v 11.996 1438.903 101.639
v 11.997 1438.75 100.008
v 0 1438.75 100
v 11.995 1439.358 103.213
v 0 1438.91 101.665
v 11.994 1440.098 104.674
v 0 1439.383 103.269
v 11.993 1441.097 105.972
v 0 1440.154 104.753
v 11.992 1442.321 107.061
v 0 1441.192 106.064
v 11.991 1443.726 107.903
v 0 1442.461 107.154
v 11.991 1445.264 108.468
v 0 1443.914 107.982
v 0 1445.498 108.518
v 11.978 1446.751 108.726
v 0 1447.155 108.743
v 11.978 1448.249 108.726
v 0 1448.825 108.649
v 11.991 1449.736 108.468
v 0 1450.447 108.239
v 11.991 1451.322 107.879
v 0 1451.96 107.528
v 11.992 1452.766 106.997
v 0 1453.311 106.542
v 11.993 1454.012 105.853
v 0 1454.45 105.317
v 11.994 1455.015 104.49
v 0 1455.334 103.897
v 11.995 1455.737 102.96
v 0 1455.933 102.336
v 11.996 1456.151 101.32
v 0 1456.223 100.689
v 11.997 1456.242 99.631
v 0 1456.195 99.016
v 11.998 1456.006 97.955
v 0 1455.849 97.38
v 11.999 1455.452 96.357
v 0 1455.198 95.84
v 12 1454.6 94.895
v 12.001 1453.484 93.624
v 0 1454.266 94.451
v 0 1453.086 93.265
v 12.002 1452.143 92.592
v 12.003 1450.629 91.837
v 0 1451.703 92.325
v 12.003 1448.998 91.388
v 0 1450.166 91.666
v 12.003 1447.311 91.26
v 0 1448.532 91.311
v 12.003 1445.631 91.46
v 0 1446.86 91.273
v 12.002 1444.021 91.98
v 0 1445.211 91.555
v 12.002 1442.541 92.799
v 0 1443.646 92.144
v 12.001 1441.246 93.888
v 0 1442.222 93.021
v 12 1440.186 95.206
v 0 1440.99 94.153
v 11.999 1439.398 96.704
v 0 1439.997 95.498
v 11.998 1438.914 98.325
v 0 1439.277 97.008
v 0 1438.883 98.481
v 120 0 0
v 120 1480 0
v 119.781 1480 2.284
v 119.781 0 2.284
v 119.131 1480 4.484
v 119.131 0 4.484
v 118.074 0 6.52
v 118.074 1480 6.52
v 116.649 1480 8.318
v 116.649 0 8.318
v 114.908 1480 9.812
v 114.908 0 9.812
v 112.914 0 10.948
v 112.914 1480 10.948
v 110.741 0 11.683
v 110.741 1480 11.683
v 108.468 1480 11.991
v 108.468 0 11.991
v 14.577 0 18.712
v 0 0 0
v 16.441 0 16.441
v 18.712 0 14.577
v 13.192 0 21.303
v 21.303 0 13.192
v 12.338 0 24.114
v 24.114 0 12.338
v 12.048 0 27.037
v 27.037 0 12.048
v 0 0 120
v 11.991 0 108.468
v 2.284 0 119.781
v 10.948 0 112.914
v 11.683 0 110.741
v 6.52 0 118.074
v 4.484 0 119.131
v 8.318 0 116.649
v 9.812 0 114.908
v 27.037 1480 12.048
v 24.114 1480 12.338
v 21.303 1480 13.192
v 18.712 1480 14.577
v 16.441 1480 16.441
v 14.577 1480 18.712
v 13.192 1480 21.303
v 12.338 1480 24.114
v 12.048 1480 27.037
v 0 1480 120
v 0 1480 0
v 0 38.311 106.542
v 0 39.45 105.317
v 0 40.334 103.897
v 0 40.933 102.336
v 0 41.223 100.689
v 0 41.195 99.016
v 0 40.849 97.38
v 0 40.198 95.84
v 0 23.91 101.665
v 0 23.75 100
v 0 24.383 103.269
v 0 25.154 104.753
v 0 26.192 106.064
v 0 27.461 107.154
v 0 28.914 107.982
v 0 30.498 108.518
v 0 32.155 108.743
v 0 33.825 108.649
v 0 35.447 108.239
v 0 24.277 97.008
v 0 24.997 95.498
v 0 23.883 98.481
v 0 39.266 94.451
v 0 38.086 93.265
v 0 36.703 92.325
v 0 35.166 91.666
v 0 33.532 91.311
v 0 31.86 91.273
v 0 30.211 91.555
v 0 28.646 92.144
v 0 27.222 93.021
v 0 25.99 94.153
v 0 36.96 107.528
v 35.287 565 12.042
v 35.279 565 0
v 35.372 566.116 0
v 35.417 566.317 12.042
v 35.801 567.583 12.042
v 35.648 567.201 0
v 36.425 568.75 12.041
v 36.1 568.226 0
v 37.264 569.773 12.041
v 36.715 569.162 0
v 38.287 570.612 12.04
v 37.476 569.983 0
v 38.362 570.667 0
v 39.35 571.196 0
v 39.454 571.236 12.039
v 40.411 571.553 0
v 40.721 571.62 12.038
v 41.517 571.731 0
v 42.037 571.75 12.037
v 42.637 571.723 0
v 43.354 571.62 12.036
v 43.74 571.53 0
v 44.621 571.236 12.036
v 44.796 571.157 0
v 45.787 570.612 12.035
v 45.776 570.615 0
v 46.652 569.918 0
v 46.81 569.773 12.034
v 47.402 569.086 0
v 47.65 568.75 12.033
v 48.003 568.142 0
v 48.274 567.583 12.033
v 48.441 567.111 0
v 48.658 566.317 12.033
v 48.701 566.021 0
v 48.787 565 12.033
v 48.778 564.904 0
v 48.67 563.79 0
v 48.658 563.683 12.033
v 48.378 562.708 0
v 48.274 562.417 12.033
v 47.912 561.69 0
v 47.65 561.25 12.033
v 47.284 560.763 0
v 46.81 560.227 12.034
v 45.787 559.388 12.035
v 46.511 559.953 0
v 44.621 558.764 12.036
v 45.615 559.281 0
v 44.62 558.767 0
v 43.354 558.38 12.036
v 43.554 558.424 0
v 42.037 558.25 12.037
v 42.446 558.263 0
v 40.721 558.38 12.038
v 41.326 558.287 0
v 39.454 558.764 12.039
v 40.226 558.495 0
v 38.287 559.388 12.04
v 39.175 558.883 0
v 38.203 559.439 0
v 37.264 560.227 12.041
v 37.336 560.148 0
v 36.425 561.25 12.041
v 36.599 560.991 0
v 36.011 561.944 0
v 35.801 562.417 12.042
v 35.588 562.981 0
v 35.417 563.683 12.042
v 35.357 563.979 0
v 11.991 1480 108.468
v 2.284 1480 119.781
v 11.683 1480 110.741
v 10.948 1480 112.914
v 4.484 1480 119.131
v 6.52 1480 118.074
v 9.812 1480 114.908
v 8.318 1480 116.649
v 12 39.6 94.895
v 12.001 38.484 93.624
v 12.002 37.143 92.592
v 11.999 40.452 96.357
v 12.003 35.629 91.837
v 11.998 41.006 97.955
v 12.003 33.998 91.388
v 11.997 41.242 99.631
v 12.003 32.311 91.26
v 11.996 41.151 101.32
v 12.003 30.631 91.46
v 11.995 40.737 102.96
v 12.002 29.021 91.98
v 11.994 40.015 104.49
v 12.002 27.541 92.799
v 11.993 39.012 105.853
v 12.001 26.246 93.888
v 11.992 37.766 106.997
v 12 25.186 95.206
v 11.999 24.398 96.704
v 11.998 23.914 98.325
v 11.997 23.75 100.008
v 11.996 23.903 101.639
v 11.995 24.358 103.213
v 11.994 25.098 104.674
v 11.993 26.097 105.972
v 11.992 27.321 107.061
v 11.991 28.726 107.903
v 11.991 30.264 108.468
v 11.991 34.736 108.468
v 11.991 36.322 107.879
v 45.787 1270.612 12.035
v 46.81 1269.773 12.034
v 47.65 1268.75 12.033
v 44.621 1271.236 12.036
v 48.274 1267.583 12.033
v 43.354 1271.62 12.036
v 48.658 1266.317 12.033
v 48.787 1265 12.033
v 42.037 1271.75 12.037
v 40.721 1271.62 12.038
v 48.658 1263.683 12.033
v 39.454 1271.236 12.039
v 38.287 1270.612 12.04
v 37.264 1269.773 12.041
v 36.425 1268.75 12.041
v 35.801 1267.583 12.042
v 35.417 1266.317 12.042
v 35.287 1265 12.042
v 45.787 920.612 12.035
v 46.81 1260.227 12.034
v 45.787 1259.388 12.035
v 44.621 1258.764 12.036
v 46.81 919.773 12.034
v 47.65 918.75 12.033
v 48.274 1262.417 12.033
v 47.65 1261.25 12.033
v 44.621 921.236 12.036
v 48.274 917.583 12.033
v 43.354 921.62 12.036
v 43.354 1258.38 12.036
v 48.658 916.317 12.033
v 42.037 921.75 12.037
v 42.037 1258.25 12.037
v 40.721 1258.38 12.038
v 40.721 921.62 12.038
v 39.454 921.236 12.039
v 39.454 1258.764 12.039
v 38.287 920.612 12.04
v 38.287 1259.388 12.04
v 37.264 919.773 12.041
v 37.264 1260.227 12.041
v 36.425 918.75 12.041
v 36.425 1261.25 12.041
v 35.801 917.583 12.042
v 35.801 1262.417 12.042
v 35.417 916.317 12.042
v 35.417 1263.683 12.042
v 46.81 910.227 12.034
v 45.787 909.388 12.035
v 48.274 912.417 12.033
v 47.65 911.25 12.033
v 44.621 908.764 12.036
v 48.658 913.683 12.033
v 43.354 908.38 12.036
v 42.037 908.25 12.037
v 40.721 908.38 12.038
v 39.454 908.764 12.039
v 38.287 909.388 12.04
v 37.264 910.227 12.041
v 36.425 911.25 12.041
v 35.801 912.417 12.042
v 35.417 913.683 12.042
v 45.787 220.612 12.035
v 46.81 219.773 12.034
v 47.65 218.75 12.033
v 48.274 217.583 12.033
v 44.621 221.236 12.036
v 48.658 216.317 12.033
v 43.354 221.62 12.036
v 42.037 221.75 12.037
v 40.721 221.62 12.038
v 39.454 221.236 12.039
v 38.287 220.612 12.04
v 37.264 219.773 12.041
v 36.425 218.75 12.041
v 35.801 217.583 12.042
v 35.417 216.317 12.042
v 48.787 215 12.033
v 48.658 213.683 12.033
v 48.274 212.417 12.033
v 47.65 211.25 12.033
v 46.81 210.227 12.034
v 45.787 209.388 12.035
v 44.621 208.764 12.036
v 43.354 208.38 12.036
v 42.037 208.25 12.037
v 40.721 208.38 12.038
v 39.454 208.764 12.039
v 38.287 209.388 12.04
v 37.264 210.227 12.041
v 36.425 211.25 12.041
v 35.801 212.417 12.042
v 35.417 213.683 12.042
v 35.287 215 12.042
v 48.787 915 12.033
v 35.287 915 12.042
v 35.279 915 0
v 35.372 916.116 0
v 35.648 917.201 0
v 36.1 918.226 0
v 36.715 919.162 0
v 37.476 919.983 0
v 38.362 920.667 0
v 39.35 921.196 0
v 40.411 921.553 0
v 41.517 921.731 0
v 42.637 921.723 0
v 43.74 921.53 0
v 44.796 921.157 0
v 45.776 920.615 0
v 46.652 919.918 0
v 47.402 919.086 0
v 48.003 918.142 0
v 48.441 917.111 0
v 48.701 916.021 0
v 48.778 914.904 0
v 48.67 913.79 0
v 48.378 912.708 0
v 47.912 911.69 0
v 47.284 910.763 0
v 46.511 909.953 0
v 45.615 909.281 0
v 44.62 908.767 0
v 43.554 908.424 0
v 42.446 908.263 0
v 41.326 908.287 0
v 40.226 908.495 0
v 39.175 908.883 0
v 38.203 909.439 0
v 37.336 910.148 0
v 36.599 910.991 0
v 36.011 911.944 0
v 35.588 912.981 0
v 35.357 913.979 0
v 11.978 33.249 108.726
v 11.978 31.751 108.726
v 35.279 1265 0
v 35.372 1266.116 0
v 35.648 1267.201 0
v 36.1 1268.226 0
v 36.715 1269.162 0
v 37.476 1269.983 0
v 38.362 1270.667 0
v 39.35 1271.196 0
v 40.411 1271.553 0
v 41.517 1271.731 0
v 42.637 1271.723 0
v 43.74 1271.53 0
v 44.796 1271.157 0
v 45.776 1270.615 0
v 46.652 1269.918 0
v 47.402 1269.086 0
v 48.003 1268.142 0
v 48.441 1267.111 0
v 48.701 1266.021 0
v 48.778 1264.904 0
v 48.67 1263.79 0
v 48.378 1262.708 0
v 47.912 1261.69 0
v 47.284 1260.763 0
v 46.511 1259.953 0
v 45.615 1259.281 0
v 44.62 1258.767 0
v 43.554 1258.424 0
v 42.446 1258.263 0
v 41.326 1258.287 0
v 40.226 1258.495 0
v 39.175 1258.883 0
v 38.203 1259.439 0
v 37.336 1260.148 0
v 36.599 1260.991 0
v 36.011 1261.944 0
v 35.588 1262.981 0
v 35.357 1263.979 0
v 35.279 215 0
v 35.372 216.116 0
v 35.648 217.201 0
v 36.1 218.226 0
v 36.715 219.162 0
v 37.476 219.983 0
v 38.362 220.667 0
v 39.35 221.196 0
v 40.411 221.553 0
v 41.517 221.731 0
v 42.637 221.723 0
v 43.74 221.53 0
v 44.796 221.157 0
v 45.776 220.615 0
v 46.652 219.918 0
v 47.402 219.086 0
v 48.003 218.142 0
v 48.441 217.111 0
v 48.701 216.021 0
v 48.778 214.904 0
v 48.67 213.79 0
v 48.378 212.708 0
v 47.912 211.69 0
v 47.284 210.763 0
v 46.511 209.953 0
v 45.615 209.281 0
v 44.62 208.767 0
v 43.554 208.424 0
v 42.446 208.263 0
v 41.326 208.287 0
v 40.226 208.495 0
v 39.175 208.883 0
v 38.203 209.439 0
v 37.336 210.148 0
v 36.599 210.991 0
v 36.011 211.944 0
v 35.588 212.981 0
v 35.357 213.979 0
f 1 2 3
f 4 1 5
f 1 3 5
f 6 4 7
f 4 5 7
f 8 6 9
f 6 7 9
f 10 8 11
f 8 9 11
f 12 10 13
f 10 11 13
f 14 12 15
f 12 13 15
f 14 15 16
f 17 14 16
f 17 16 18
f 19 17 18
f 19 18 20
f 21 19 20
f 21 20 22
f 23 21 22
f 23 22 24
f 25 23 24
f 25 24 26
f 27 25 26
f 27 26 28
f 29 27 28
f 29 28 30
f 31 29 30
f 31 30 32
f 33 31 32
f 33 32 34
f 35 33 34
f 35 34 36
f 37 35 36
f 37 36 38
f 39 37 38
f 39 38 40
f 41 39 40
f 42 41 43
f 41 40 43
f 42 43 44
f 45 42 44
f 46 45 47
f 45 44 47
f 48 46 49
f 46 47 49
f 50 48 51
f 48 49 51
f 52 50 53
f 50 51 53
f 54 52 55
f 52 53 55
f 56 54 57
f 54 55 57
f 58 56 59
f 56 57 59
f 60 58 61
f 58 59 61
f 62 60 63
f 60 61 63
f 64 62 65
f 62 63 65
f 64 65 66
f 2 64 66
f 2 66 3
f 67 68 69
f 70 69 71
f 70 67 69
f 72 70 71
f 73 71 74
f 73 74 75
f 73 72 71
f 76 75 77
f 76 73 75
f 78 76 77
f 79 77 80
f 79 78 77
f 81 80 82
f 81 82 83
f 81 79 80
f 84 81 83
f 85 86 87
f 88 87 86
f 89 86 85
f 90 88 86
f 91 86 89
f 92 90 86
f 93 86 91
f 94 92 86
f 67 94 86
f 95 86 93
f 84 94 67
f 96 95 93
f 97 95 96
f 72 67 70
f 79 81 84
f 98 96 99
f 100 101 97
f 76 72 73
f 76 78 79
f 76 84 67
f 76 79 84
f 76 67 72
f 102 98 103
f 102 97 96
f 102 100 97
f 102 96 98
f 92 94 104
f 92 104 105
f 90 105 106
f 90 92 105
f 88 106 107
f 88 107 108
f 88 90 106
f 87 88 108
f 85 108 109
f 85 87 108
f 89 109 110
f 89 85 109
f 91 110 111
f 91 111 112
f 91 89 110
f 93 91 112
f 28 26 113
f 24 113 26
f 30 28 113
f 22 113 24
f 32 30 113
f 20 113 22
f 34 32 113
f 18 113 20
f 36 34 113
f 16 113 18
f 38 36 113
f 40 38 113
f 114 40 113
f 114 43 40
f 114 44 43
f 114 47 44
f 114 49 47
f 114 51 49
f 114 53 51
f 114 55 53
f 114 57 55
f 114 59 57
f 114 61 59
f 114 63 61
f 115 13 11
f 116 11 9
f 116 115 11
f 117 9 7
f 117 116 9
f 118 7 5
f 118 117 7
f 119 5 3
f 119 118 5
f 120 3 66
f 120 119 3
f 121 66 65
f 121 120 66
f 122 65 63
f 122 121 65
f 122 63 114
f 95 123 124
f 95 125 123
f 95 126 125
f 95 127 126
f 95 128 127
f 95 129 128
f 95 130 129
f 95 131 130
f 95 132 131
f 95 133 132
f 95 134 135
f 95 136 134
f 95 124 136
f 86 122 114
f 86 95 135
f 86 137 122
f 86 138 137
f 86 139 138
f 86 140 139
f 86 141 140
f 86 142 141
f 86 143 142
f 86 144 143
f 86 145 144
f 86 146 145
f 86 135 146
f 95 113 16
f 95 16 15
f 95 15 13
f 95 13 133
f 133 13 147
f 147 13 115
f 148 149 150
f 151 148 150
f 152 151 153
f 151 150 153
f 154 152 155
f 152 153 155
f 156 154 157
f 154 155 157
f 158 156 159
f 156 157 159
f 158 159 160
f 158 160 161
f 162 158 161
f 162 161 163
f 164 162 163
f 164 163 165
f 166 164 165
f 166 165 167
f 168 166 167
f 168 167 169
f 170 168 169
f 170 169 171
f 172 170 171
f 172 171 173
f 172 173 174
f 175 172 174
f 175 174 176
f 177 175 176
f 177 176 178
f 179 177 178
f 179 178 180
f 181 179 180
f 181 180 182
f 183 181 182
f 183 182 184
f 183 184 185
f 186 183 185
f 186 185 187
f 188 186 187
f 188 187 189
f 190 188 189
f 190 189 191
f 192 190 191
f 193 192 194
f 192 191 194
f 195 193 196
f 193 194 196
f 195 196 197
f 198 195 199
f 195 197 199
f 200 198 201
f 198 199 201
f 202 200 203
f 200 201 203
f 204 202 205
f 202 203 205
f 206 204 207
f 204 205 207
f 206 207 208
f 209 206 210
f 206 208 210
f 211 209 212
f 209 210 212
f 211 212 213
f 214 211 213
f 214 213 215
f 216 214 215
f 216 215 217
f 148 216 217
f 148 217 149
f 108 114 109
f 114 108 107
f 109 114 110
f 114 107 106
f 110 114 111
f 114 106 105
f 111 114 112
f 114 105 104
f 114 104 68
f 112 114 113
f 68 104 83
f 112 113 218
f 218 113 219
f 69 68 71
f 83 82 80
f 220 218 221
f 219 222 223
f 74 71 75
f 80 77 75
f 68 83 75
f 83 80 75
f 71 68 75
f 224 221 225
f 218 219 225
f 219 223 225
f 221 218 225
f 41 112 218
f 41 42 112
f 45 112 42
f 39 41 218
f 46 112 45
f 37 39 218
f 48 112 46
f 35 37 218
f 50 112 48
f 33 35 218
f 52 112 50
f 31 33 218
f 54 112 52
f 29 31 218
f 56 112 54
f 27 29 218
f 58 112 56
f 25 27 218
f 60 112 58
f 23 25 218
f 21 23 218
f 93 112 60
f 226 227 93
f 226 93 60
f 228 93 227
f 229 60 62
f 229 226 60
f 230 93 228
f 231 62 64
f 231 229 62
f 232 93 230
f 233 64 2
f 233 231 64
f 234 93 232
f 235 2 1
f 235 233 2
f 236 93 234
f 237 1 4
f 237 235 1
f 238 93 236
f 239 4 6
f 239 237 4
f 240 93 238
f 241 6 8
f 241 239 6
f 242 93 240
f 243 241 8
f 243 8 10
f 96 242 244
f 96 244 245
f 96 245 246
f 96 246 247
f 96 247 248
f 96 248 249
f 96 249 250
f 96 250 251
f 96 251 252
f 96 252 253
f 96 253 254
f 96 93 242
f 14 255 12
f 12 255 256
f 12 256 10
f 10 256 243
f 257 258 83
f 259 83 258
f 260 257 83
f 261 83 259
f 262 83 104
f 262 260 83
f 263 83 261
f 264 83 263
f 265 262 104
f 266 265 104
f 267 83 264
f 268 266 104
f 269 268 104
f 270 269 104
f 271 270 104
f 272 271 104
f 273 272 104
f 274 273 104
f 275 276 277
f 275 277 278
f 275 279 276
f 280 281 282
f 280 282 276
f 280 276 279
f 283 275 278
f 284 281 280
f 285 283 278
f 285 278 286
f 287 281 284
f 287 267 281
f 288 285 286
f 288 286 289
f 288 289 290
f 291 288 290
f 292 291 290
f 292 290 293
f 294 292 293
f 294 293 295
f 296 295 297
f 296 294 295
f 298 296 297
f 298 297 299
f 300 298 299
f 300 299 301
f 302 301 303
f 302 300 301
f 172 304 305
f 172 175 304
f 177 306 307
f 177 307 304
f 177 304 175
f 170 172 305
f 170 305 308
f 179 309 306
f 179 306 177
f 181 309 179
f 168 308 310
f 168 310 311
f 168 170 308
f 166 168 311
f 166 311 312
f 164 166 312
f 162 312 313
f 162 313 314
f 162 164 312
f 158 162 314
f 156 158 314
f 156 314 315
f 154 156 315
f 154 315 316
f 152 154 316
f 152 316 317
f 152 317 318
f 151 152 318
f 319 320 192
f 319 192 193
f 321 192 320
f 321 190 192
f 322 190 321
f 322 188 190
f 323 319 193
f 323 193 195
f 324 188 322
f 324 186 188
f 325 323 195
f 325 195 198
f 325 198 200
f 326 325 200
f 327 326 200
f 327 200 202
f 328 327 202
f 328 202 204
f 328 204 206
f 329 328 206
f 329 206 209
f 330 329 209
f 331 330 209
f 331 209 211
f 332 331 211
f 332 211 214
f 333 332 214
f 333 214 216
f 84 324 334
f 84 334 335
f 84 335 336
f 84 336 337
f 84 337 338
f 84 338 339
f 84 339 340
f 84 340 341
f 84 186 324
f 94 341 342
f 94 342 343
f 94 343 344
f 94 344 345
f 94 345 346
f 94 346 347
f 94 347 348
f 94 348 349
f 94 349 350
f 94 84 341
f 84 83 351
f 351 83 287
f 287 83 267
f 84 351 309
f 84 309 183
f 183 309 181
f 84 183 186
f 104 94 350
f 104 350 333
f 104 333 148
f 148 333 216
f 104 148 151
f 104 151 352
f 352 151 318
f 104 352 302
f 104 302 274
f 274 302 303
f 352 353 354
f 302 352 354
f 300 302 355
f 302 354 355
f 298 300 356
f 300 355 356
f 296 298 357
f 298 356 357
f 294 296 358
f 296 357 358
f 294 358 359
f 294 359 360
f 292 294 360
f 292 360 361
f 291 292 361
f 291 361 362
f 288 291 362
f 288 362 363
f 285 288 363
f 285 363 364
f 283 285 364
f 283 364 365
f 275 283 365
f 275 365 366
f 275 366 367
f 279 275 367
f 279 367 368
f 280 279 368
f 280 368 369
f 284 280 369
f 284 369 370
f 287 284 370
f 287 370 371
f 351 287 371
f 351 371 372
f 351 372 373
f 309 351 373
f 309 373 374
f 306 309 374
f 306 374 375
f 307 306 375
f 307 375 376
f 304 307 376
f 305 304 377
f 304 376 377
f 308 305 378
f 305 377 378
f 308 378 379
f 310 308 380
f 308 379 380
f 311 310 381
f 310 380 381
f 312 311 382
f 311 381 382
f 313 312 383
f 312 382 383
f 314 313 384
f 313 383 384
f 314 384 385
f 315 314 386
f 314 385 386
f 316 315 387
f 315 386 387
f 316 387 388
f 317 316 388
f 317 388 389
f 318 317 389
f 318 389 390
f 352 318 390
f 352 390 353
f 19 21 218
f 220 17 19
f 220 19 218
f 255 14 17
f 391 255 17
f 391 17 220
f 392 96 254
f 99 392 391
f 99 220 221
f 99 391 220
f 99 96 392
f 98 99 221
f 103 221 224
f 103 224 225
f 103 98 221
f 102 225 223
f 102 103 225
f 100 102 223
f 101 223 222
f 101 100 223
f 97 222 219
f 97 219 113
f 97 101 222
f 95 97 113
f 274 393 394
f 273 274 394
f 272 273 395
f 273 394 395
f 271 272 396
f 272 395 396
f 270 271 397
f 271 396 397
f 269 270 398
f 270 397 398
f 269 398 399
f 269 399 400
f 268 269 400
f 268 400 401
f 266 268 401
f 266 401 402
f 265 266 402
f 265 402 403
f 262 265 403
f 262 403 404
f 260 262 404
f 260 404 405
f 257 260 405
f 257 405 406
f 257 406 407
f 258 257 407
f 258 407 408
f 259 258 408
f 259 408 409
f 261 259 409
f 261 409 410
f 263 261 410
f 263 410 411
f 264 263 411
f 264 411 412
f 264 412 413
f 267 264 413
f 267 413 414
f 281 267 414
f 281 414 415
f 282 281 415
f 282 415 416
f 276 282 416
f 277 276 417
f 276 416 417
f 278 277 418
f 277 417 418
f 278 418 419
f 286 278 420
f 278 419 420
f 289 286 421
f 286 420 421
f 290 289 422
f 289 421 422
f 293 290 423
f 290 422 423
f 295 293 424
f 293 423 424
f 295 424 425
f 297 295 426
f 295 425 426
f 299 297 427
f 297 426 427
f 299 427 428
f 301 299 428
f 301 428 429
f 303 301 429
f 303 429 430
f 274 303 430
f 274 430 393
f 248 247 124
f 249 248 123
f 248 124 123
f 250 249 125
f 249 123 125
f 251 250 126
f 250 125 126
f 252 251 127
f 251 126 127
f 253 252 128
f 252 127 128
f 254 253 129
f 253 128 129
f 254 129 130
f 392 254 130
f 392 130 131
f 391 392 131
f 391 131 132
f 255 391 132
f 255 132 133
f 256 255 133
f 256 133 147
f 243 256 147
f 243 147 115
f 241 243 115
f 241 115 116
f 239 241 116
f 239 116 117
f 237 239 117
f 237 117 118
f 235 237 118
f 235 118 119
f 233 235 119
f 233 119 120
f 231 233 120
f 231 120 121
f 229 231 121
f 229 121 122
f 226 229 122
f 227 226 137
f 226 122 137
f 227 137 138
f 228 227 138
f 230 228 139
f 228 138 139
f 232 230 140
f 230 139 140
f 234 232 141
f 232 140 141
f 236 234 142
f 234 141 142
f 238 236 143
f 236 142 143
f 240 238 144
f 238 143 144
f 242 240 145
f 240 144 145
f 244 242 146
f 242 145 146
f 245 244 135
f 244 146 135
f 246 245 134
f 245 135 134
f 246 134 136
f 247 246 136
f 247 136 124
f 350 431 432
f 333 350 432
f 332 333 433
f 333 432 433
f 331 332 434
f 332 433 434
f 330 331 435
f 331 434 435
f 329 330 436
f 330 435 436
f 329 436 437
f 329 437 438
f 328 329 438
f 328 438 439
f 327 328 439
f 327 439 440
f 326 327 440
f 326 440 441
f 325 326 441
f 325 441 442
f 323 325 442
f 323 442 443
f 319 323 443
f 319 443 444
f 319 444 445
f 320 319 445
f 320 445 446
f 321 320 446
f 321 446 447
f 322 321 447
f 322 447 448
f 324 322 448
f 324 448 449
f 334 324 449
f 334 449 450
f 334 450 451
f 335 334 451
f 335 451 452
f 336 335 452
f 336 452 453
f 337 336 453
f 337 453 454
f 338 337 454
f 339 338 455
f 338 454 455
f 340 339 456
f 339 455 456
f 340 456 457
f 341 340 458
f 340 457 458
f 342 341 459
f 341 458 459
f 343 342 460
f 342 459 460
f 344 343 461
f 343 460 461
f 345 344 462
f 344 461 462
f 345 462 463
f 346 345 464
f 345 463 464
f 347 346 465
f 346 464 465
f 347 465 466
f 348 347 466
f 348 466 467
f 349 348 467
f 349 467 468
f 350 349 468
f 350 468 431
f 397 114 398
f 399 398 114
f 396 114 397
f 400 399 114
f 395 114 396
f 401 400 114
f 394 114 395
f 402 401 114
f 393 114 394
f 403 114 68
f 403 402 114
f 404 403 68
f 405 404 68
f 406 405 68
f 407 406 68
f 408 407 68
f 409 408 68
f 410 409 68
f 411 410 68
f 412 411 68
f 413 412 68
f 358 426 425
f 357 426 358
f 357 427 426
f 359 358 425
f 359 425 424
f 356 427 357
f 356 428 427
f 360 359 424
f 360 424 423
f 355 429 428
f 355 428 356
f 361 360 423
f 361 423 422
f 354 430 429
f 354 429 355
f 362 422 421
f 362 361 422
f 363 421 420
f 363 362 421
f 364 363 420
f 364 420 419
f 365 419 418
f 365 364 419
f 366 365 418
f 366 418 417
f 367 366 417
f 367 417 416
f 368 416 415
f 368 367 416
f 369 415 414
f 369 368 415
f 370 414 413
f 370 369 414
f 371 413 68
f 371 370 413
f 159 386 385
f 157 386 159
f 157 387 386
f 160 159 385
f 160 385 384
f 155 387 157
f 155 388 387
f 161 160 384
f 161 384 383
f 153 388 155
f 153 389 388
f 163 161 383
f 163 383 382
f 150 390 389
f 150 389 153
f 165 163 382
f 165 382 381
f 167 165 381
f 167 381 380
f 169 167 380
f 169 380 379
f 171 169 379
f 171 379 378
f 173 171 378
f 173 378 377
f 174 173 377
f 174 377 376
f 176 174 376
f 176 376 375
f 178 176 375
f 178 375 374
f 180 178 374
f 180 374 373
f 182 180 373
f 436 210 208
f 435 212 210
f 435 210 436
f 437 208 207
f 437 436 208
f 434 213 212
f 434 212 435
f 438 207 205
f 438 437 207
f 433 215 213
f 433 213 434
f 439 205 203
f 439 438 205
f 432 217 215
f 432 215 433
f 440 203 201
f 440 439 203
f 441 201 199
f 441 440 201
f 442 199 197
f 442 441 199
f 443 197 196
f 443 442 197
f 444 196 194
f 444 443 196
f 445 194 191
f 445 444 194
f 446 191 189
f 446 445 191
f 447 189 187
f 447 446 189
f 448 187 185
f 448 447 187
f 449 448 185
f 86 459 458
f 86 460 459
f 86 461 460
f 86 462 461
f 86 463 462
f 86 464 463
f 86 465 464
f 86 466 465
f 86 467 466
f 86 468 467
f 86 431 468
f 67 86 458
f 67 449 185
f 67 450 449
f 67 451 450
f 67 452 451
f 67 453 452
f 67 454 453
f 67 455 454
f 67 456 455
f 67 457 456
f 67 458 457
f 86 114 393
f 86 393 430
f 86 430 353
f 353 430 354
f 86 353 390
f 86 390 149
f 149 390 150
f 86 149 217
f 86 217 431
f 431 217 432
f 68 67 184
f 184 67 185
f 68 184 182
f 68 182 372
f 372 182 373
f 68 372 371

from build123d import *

# Parameters (mm, degrees)
F2_DEPTH = 1480
F4_D     = 17.5
F6_D     = 13.5


with BuildPart() as f2:
    # F1 (on Front) → F2 (new body)
    with BuildSketch(Plane.XZ):
        with BuildLine():
            Line((0, 120), (0, 0))
            Line((0, 0), (120, 0))
            ThreePointArc((120, 0), (116.6491099907, 8.3182267562), (108.4678506053, 11.9908763571))
            Line((108.4678506053, 11.9908763571), (27.0373860807, 12.047892481))
            ThreePointArc((27.0373860807, 12.047892481), (16.4412870863, 16.4412870863), (12.047892481, 27.0373860807))
            Line((12.047892481, 27.0373860807), (11.9908763571, 108.4678506053))
            ThreePointArc((11.9908763571, 108.4678506053), (8.3182267562, 116.6491099907), (0, 120))
        make_face()
    extrude(amount=-F2_DEPTH)

    # F4 (through all)
    with Locations(Plane(origin=(12.0668176491, 0, 0.0084489653), x_dir=(0, 1, 0), z_dir=(0.9999997549, 0, 0.0007001816))):
        with Locations((32.5, 100), (1447.5, 100)):
            Hole(F4_D / 2)

    # F6 (through all)
    with Locations(Plane(origin=(0.0084489653, 0, 12.0668176491), x_dir=(0.9999997549, 0, -0.0007001816), z_dir=(0.0007001816, 0, 0.9999997549))):
        with Locations((42.0289584485, 215), (42.0289584485, 565), (42.0289584485, 915), (42.0289584485, 1265)):
            Hole(F6_D / 2)


solid = f2.part
